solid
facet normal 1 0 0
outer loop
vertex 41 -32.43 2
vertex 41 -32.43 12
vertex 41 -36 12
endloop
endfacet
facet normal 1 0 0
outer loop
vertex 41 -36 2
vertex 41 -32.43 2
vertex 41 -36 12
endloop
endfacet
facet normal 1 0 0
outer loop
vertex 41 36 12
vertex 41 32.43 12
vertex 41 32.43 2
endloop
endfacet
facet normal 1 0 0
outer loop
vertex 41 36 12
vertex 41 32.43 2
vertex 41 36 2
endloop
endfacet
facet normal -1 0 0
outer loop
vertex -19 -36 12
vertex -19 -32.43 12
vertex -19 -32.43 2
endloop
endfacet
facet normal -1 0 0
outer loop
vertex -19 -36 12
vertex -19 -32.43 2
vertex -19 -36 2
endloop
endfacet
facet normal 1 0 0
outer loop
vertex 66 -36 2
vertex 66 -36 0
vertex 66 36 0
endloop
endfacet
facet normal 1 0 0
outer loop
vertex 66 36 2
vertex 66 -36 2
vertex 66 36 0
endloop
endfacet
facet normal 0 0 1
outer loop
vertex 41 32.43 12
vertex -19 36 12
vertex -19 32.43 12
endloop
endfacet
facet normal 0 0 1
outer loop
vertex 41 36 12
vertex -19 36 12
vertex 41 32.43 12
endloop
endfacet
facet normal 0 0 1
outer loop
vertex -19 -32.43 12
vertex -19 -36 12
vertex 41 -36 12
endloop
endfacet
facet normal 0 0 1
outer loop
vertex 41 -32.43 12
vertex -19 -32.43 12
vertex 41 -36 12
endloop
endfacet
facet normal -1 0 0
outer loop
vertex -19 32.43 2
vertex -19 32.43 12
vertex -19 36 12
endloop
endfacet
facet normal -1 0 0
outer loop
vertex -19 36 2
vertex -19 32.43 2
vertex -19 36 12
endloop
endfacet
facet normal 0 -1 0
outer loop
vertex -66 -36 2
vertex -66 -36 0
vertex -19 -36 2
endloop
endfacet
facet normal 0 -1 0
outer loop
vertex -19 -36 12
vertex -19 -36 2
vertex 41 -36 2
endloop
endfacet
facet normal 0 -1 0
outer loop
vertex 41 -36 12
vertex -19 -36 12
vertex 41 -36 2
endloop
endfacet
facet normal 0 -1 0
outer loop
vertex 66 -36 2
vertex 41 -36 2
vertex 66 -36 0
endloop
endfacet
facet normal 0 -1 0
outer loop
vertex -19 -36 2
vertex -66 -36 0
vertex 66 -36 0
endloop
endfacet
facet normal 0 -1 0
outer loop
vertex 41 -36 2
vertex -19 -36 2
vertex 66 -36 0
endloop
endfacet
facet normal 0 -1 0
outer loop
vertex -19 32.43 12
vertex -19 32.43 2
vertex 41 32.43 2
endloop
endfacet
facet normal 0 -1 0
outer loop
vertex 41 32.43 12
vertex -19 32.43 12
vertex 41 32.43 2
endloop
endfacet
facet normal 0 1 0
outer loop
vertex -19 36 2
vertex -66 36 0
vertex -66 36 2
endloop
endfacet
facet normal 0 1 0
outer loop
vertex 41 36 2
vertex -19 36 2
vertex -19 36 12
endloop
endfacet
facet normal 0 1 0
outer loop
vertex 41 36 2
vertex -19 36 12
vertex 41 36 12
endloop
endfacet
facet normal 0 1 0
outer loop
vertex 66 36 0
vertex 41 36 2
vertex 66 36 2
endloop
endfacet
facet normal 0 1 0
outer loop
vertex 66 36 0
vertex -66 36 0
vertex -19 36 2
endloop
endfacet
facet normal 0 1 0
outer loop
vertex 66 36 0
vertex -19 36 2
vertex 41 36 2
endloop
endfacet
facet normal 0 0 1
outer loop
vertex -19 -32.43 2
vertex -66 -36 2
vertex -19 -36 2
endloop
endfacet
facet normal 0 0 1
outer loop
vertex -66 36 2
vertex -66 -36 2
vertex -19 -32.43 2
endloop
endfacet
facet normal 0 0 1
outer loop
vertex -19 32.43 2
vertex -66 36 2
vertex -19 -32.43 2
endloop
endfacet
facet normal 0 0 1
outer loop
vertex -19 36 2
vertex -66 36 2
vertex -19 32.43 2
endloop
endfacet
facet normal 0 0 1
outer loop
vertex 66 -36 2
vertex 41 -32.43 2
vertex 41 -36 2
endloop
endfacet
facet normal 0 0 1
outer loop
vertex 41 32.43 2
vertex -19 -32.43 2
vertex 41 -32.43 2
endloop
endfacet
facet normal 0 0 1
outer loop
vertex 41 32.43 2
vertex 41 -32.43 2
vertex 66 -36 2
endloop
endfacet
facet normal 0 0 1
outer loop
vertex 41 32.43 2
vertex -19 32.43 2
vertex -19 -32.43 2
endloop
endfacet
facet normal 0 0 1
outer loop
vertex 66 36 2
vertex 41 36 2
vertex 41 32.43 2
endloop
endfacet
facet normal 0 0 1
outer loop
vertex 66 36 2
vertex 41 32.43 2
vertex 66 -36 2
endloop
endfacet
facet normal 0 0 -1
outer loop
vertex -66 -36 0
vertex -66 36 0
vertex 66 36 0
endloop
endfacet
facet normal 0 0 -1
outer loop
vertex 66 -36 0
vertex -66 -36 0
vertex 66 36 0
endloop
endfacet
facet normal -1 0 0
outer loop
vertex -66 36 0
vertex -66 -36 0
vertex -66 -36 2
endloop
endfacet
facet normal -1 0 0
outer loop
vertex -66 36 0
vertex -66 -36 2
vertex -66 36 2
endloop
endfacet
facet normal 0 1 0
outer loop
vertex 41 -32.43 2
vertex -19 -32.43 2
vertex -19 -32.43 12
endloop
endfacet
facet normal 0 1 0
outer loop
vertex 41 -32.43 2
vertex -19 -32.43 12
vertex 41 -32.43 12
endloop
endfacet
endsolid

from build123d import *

# Parameters (mm, degrees)
SKETCH1_W           = 132
SKETCH1_H           = 72
BOSS_EXTRUDE1_DEPTH = 2
SKETCH2_W           = 60
SKETCH2_H           = 3.570225369
BOSS_EXTRUDE2_DEPTH = 10


with BuildPart() as part:
    # Sketch1 → Boss-Extrude1 (new body)
    with BuildSketch(Plane.XY):
        Rectangle(SKETCH1_W, SKETCH1_H)
    extrude(amount=BOSS_EXTRUDE1_DEPTH)

    # Sketch2 → Boss-Extrude2 (add)
    with BuildSketch(Plane.XY.offset(2)):
        with Locations((11, 34.214887316)):
            Rectangle(SKETCH2_W, SKETCH2_H)
    boss_extrude2 = extrude(amount=BOSS_EXTRUDE2_DEPTH)

    # Mirror1: Boss-Extrude2 across plane
    add(boss_extrude2.mirror(Plane.ZX))


solid = part.part
